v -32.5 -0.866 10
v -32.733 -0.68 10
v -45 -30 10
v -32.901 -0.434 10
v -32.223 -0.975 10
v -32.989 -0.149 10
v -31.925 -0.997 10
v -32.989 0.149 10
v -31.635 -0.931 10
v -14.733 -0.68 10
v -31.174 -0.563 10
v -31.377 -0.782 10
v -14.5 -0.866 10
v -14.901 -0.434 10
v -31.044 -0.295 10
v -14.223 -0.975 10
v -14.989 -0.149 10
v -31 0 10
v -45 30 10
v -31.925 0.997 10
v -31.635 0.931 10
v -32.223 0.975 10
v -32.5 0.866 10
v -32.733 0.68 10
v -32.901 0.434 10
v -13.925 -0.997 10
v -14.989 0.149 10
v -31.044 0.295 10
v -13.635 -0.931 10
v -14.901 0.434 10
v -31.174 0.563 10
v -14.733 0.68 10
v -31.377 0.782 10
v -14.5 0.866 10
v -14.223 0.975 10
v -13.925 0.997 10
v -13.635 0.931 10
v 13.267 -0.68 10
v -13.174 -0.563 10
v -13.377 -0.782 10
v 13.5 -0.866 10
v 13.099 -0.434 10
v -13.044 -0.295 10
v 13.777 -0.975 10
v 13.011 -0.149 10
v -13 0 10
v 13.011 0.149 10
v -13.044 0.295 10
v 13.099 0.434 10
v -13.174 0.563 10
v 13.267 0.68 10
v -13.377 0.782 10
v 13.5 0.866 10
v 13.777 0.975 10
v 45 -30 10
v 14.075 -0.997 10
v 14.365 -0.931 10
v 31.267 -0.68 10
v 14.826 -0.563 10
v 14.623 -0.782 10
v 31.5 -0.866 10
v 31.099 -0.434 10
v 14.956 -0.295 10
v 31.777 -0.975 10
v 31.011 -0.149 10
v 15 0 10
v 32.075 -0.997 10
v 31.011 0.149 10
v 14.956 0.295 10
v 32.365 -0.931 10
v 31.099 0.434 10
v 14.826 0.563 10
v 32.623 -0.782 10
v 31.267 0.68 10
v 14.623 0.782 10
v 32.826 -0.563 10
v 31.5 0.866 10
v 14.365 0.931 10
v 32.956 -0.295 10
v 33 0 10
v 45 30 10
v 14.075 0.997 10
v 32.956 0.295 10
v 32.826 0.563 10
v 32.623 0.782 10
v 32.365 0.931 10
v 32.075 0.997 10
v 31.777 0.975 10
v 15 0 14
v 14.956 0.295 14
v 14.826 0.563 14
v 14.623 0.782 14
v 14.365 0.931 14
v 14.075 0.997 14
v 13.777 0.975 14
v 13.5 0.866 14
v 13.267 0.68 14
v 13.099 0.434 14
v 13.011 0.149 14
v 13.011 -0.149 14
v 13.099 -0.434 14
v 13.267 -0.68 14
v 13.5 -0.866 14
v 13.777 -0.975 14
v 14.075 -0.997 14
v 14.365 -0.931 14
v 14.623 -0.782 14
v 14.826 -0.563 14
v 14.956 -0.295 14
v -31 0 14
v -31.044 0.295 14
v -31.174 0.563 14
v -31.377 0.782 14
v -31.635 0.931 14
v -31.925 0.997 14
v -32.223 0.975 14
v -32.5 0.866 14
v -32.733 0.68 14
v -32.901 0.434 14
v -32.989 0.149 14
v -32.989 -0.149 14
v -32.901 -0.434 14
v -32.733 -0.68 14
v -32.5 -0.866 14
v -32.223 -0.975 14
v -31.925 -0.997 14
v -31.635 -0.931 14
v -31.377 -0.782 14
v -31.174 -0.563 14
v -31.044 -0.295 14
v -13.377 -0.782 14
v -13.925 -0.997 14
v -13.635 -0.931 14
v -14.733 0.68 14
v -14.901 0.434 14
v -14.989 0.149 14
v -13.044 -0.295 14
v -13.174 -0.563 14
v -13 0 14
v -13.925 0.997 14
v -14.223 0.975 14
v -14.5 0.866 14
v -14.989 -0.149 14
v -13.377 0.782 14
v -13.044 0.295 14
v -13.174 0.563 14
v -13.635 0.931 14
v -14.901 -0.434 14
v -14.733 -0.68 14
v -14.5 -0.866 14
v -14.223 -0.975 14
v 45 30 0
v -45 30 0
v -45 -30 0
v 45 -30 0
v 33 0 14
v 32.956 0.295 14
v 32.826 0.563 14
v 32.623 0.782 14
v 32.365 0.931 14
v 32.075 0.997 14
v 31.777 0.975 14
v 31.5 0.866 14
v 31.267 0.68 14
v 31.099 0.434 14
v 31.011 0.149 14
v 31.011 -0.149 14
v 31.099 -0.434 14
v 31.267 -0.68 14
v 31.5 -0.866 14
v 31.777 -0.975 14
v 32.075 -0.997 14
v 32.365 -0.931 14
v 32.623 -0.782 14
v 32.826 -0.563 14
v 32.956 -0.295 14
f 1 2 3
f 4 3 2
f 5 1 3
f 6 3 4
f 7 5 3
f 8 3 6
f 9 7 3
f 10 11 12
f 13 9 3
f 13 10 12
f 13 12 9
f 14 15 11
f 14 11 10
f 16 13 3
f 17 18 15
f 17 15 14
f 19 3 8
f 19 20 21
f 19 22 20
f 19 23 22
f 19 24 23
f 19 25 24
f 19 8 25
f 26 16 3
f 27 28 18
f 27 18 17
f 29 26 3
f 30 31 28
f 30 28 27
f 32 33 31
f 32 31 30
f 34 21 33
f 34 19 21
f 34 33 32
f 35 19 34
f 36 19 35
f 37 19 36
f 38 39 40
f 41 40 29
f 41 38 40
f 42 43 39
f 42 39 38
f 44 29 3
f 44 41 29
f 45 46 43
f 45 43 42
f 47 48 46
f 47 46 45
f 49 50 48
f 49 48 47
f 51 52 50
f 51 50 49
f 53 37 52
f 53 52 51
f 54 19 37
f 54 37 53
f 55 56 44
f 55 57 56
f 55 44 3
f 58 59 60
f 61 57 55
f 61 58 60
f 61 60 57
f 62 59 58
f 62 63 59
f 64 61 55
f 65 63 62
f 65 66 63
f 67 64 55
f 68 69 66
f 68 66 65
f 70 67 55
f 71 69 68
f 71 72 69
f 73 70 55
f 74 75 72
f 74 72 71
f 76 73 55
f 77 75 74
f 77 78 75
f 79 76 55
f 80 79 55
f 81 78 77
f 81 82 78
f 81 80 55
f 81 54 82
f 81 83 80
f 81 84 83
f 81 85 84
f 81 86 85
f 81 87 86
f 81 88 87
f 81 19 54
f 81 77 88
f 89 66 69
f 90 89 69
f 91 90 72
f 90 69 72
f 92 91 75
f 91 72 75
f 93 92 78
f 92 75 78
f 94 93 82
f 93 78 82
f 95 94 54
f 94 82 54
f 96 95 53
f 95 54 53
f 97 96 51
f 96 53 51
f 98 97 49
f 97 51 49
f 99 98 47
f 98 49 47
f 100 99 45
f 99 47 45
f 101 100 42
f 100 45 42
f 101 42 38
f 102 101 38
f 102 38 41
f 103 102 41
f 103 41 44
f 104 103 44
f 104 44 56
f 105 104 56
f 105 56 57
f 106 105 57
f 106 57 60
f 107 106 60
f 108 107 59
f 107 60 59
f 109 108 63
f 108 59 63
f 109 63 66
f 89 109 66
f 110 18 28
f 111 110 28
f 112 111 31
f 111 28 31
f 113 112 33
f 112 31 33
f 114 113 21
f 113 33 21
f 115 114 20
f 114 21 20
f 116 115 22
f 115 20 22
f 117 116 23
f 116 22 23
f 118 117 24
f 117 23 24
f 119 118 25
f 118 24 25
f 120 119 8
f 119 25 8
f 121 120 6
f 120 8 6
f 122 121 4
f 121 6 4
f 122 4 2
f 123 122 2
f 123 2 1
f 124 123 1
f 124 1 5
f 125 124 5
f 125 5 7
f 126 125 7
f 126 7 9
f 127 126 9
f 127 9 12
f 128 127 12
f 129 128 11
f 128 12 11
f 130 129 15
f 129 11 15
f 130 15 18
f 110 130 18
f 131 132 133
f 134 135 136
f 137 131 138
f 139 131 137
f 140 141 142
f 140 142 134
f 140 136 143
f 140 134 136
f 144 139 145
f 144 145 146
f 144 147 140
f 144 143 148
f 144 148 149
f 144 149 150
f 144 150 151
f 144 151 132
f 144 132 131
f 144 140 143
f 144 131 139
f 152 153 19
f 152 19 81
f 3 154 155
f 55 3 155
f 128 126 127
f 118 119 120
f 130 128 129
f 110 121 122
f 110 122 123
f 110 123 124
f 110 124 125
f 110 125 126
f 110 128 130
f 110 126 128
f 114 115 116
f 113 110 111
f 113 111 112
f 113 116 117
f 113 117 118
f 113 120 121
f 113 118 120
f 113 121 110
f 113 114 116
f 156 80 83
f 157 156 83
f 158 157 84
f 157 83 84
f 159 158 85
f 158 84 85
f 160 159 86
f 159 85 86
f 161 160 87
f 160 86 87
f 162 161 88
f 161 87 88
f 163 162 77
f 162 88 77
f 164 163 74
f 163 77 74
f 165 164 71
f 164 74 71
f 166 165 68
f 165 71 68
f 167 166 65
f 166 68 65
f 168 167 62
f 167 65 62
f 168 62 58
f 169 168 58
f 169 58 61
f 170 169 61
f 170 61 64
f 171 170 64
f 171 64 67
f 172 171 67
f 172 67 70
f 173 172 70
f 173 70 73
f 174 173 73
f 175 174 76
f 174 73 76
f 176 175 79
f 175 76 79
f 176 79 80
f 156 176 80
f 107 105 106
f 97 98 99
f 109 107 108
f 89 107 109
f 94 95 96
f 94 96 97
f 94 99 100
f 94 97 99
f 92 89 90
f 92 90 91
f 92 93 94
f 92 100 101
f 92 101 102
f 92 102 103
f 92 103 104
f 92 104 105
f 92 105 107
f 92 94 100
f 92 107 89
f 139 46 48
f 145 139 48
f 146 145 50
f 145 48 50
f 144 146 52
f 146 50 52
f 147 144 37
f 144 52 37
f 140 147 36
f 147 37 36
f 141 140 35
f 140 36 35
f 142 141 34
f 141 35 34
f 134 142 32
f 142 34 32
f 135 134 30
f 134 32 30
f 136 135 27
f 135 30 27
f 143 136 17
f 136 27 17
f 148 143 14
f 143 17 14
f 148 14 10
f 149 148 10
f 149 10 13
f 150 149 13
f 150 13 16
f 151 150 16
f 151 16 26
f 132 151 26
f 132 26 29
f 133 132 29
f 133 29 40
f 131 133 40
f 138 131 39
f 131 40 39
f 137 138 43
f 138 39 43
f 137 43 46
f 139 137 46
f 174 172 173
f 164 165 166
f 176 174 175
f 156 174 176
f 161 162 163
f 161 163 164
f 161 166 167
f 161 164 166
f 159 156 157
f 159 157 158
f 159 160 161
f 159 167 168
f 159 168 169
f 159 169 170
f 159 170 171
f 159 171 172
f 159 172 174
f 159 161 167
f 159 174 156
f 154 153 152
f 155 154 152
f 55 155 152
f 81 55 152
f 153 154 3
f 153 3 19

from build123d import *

# Parameters (mm, degrees)
F0_W     = 90
F0_H     = 60
F1_DEPTH = 10
F2_R     = 1
F3_DEPTH = 4


with BuildPart() as f1:
    # F0 (on Top) → F1 (new body)
    with BuildSketch(Plane.XY):
        Rectangle(F0_W, F0_H)
    extrude(amount=F1_DEPTH)

    # F2 (on face) → F3 (join)
    with BuildSketch(Plane.XY.offset(10)):
        with Locations((-14, 0)):
            Circle(F2_R)
        with Locations((14, 0)):
            Circle(F2_R)
        with Locations((-32, 0)):
            Circle(F2_R)
        with Locations((32, 0)):
            Circle(F2_R)
    extrude(amount=F3_DEPTH)


solid = f1.part
